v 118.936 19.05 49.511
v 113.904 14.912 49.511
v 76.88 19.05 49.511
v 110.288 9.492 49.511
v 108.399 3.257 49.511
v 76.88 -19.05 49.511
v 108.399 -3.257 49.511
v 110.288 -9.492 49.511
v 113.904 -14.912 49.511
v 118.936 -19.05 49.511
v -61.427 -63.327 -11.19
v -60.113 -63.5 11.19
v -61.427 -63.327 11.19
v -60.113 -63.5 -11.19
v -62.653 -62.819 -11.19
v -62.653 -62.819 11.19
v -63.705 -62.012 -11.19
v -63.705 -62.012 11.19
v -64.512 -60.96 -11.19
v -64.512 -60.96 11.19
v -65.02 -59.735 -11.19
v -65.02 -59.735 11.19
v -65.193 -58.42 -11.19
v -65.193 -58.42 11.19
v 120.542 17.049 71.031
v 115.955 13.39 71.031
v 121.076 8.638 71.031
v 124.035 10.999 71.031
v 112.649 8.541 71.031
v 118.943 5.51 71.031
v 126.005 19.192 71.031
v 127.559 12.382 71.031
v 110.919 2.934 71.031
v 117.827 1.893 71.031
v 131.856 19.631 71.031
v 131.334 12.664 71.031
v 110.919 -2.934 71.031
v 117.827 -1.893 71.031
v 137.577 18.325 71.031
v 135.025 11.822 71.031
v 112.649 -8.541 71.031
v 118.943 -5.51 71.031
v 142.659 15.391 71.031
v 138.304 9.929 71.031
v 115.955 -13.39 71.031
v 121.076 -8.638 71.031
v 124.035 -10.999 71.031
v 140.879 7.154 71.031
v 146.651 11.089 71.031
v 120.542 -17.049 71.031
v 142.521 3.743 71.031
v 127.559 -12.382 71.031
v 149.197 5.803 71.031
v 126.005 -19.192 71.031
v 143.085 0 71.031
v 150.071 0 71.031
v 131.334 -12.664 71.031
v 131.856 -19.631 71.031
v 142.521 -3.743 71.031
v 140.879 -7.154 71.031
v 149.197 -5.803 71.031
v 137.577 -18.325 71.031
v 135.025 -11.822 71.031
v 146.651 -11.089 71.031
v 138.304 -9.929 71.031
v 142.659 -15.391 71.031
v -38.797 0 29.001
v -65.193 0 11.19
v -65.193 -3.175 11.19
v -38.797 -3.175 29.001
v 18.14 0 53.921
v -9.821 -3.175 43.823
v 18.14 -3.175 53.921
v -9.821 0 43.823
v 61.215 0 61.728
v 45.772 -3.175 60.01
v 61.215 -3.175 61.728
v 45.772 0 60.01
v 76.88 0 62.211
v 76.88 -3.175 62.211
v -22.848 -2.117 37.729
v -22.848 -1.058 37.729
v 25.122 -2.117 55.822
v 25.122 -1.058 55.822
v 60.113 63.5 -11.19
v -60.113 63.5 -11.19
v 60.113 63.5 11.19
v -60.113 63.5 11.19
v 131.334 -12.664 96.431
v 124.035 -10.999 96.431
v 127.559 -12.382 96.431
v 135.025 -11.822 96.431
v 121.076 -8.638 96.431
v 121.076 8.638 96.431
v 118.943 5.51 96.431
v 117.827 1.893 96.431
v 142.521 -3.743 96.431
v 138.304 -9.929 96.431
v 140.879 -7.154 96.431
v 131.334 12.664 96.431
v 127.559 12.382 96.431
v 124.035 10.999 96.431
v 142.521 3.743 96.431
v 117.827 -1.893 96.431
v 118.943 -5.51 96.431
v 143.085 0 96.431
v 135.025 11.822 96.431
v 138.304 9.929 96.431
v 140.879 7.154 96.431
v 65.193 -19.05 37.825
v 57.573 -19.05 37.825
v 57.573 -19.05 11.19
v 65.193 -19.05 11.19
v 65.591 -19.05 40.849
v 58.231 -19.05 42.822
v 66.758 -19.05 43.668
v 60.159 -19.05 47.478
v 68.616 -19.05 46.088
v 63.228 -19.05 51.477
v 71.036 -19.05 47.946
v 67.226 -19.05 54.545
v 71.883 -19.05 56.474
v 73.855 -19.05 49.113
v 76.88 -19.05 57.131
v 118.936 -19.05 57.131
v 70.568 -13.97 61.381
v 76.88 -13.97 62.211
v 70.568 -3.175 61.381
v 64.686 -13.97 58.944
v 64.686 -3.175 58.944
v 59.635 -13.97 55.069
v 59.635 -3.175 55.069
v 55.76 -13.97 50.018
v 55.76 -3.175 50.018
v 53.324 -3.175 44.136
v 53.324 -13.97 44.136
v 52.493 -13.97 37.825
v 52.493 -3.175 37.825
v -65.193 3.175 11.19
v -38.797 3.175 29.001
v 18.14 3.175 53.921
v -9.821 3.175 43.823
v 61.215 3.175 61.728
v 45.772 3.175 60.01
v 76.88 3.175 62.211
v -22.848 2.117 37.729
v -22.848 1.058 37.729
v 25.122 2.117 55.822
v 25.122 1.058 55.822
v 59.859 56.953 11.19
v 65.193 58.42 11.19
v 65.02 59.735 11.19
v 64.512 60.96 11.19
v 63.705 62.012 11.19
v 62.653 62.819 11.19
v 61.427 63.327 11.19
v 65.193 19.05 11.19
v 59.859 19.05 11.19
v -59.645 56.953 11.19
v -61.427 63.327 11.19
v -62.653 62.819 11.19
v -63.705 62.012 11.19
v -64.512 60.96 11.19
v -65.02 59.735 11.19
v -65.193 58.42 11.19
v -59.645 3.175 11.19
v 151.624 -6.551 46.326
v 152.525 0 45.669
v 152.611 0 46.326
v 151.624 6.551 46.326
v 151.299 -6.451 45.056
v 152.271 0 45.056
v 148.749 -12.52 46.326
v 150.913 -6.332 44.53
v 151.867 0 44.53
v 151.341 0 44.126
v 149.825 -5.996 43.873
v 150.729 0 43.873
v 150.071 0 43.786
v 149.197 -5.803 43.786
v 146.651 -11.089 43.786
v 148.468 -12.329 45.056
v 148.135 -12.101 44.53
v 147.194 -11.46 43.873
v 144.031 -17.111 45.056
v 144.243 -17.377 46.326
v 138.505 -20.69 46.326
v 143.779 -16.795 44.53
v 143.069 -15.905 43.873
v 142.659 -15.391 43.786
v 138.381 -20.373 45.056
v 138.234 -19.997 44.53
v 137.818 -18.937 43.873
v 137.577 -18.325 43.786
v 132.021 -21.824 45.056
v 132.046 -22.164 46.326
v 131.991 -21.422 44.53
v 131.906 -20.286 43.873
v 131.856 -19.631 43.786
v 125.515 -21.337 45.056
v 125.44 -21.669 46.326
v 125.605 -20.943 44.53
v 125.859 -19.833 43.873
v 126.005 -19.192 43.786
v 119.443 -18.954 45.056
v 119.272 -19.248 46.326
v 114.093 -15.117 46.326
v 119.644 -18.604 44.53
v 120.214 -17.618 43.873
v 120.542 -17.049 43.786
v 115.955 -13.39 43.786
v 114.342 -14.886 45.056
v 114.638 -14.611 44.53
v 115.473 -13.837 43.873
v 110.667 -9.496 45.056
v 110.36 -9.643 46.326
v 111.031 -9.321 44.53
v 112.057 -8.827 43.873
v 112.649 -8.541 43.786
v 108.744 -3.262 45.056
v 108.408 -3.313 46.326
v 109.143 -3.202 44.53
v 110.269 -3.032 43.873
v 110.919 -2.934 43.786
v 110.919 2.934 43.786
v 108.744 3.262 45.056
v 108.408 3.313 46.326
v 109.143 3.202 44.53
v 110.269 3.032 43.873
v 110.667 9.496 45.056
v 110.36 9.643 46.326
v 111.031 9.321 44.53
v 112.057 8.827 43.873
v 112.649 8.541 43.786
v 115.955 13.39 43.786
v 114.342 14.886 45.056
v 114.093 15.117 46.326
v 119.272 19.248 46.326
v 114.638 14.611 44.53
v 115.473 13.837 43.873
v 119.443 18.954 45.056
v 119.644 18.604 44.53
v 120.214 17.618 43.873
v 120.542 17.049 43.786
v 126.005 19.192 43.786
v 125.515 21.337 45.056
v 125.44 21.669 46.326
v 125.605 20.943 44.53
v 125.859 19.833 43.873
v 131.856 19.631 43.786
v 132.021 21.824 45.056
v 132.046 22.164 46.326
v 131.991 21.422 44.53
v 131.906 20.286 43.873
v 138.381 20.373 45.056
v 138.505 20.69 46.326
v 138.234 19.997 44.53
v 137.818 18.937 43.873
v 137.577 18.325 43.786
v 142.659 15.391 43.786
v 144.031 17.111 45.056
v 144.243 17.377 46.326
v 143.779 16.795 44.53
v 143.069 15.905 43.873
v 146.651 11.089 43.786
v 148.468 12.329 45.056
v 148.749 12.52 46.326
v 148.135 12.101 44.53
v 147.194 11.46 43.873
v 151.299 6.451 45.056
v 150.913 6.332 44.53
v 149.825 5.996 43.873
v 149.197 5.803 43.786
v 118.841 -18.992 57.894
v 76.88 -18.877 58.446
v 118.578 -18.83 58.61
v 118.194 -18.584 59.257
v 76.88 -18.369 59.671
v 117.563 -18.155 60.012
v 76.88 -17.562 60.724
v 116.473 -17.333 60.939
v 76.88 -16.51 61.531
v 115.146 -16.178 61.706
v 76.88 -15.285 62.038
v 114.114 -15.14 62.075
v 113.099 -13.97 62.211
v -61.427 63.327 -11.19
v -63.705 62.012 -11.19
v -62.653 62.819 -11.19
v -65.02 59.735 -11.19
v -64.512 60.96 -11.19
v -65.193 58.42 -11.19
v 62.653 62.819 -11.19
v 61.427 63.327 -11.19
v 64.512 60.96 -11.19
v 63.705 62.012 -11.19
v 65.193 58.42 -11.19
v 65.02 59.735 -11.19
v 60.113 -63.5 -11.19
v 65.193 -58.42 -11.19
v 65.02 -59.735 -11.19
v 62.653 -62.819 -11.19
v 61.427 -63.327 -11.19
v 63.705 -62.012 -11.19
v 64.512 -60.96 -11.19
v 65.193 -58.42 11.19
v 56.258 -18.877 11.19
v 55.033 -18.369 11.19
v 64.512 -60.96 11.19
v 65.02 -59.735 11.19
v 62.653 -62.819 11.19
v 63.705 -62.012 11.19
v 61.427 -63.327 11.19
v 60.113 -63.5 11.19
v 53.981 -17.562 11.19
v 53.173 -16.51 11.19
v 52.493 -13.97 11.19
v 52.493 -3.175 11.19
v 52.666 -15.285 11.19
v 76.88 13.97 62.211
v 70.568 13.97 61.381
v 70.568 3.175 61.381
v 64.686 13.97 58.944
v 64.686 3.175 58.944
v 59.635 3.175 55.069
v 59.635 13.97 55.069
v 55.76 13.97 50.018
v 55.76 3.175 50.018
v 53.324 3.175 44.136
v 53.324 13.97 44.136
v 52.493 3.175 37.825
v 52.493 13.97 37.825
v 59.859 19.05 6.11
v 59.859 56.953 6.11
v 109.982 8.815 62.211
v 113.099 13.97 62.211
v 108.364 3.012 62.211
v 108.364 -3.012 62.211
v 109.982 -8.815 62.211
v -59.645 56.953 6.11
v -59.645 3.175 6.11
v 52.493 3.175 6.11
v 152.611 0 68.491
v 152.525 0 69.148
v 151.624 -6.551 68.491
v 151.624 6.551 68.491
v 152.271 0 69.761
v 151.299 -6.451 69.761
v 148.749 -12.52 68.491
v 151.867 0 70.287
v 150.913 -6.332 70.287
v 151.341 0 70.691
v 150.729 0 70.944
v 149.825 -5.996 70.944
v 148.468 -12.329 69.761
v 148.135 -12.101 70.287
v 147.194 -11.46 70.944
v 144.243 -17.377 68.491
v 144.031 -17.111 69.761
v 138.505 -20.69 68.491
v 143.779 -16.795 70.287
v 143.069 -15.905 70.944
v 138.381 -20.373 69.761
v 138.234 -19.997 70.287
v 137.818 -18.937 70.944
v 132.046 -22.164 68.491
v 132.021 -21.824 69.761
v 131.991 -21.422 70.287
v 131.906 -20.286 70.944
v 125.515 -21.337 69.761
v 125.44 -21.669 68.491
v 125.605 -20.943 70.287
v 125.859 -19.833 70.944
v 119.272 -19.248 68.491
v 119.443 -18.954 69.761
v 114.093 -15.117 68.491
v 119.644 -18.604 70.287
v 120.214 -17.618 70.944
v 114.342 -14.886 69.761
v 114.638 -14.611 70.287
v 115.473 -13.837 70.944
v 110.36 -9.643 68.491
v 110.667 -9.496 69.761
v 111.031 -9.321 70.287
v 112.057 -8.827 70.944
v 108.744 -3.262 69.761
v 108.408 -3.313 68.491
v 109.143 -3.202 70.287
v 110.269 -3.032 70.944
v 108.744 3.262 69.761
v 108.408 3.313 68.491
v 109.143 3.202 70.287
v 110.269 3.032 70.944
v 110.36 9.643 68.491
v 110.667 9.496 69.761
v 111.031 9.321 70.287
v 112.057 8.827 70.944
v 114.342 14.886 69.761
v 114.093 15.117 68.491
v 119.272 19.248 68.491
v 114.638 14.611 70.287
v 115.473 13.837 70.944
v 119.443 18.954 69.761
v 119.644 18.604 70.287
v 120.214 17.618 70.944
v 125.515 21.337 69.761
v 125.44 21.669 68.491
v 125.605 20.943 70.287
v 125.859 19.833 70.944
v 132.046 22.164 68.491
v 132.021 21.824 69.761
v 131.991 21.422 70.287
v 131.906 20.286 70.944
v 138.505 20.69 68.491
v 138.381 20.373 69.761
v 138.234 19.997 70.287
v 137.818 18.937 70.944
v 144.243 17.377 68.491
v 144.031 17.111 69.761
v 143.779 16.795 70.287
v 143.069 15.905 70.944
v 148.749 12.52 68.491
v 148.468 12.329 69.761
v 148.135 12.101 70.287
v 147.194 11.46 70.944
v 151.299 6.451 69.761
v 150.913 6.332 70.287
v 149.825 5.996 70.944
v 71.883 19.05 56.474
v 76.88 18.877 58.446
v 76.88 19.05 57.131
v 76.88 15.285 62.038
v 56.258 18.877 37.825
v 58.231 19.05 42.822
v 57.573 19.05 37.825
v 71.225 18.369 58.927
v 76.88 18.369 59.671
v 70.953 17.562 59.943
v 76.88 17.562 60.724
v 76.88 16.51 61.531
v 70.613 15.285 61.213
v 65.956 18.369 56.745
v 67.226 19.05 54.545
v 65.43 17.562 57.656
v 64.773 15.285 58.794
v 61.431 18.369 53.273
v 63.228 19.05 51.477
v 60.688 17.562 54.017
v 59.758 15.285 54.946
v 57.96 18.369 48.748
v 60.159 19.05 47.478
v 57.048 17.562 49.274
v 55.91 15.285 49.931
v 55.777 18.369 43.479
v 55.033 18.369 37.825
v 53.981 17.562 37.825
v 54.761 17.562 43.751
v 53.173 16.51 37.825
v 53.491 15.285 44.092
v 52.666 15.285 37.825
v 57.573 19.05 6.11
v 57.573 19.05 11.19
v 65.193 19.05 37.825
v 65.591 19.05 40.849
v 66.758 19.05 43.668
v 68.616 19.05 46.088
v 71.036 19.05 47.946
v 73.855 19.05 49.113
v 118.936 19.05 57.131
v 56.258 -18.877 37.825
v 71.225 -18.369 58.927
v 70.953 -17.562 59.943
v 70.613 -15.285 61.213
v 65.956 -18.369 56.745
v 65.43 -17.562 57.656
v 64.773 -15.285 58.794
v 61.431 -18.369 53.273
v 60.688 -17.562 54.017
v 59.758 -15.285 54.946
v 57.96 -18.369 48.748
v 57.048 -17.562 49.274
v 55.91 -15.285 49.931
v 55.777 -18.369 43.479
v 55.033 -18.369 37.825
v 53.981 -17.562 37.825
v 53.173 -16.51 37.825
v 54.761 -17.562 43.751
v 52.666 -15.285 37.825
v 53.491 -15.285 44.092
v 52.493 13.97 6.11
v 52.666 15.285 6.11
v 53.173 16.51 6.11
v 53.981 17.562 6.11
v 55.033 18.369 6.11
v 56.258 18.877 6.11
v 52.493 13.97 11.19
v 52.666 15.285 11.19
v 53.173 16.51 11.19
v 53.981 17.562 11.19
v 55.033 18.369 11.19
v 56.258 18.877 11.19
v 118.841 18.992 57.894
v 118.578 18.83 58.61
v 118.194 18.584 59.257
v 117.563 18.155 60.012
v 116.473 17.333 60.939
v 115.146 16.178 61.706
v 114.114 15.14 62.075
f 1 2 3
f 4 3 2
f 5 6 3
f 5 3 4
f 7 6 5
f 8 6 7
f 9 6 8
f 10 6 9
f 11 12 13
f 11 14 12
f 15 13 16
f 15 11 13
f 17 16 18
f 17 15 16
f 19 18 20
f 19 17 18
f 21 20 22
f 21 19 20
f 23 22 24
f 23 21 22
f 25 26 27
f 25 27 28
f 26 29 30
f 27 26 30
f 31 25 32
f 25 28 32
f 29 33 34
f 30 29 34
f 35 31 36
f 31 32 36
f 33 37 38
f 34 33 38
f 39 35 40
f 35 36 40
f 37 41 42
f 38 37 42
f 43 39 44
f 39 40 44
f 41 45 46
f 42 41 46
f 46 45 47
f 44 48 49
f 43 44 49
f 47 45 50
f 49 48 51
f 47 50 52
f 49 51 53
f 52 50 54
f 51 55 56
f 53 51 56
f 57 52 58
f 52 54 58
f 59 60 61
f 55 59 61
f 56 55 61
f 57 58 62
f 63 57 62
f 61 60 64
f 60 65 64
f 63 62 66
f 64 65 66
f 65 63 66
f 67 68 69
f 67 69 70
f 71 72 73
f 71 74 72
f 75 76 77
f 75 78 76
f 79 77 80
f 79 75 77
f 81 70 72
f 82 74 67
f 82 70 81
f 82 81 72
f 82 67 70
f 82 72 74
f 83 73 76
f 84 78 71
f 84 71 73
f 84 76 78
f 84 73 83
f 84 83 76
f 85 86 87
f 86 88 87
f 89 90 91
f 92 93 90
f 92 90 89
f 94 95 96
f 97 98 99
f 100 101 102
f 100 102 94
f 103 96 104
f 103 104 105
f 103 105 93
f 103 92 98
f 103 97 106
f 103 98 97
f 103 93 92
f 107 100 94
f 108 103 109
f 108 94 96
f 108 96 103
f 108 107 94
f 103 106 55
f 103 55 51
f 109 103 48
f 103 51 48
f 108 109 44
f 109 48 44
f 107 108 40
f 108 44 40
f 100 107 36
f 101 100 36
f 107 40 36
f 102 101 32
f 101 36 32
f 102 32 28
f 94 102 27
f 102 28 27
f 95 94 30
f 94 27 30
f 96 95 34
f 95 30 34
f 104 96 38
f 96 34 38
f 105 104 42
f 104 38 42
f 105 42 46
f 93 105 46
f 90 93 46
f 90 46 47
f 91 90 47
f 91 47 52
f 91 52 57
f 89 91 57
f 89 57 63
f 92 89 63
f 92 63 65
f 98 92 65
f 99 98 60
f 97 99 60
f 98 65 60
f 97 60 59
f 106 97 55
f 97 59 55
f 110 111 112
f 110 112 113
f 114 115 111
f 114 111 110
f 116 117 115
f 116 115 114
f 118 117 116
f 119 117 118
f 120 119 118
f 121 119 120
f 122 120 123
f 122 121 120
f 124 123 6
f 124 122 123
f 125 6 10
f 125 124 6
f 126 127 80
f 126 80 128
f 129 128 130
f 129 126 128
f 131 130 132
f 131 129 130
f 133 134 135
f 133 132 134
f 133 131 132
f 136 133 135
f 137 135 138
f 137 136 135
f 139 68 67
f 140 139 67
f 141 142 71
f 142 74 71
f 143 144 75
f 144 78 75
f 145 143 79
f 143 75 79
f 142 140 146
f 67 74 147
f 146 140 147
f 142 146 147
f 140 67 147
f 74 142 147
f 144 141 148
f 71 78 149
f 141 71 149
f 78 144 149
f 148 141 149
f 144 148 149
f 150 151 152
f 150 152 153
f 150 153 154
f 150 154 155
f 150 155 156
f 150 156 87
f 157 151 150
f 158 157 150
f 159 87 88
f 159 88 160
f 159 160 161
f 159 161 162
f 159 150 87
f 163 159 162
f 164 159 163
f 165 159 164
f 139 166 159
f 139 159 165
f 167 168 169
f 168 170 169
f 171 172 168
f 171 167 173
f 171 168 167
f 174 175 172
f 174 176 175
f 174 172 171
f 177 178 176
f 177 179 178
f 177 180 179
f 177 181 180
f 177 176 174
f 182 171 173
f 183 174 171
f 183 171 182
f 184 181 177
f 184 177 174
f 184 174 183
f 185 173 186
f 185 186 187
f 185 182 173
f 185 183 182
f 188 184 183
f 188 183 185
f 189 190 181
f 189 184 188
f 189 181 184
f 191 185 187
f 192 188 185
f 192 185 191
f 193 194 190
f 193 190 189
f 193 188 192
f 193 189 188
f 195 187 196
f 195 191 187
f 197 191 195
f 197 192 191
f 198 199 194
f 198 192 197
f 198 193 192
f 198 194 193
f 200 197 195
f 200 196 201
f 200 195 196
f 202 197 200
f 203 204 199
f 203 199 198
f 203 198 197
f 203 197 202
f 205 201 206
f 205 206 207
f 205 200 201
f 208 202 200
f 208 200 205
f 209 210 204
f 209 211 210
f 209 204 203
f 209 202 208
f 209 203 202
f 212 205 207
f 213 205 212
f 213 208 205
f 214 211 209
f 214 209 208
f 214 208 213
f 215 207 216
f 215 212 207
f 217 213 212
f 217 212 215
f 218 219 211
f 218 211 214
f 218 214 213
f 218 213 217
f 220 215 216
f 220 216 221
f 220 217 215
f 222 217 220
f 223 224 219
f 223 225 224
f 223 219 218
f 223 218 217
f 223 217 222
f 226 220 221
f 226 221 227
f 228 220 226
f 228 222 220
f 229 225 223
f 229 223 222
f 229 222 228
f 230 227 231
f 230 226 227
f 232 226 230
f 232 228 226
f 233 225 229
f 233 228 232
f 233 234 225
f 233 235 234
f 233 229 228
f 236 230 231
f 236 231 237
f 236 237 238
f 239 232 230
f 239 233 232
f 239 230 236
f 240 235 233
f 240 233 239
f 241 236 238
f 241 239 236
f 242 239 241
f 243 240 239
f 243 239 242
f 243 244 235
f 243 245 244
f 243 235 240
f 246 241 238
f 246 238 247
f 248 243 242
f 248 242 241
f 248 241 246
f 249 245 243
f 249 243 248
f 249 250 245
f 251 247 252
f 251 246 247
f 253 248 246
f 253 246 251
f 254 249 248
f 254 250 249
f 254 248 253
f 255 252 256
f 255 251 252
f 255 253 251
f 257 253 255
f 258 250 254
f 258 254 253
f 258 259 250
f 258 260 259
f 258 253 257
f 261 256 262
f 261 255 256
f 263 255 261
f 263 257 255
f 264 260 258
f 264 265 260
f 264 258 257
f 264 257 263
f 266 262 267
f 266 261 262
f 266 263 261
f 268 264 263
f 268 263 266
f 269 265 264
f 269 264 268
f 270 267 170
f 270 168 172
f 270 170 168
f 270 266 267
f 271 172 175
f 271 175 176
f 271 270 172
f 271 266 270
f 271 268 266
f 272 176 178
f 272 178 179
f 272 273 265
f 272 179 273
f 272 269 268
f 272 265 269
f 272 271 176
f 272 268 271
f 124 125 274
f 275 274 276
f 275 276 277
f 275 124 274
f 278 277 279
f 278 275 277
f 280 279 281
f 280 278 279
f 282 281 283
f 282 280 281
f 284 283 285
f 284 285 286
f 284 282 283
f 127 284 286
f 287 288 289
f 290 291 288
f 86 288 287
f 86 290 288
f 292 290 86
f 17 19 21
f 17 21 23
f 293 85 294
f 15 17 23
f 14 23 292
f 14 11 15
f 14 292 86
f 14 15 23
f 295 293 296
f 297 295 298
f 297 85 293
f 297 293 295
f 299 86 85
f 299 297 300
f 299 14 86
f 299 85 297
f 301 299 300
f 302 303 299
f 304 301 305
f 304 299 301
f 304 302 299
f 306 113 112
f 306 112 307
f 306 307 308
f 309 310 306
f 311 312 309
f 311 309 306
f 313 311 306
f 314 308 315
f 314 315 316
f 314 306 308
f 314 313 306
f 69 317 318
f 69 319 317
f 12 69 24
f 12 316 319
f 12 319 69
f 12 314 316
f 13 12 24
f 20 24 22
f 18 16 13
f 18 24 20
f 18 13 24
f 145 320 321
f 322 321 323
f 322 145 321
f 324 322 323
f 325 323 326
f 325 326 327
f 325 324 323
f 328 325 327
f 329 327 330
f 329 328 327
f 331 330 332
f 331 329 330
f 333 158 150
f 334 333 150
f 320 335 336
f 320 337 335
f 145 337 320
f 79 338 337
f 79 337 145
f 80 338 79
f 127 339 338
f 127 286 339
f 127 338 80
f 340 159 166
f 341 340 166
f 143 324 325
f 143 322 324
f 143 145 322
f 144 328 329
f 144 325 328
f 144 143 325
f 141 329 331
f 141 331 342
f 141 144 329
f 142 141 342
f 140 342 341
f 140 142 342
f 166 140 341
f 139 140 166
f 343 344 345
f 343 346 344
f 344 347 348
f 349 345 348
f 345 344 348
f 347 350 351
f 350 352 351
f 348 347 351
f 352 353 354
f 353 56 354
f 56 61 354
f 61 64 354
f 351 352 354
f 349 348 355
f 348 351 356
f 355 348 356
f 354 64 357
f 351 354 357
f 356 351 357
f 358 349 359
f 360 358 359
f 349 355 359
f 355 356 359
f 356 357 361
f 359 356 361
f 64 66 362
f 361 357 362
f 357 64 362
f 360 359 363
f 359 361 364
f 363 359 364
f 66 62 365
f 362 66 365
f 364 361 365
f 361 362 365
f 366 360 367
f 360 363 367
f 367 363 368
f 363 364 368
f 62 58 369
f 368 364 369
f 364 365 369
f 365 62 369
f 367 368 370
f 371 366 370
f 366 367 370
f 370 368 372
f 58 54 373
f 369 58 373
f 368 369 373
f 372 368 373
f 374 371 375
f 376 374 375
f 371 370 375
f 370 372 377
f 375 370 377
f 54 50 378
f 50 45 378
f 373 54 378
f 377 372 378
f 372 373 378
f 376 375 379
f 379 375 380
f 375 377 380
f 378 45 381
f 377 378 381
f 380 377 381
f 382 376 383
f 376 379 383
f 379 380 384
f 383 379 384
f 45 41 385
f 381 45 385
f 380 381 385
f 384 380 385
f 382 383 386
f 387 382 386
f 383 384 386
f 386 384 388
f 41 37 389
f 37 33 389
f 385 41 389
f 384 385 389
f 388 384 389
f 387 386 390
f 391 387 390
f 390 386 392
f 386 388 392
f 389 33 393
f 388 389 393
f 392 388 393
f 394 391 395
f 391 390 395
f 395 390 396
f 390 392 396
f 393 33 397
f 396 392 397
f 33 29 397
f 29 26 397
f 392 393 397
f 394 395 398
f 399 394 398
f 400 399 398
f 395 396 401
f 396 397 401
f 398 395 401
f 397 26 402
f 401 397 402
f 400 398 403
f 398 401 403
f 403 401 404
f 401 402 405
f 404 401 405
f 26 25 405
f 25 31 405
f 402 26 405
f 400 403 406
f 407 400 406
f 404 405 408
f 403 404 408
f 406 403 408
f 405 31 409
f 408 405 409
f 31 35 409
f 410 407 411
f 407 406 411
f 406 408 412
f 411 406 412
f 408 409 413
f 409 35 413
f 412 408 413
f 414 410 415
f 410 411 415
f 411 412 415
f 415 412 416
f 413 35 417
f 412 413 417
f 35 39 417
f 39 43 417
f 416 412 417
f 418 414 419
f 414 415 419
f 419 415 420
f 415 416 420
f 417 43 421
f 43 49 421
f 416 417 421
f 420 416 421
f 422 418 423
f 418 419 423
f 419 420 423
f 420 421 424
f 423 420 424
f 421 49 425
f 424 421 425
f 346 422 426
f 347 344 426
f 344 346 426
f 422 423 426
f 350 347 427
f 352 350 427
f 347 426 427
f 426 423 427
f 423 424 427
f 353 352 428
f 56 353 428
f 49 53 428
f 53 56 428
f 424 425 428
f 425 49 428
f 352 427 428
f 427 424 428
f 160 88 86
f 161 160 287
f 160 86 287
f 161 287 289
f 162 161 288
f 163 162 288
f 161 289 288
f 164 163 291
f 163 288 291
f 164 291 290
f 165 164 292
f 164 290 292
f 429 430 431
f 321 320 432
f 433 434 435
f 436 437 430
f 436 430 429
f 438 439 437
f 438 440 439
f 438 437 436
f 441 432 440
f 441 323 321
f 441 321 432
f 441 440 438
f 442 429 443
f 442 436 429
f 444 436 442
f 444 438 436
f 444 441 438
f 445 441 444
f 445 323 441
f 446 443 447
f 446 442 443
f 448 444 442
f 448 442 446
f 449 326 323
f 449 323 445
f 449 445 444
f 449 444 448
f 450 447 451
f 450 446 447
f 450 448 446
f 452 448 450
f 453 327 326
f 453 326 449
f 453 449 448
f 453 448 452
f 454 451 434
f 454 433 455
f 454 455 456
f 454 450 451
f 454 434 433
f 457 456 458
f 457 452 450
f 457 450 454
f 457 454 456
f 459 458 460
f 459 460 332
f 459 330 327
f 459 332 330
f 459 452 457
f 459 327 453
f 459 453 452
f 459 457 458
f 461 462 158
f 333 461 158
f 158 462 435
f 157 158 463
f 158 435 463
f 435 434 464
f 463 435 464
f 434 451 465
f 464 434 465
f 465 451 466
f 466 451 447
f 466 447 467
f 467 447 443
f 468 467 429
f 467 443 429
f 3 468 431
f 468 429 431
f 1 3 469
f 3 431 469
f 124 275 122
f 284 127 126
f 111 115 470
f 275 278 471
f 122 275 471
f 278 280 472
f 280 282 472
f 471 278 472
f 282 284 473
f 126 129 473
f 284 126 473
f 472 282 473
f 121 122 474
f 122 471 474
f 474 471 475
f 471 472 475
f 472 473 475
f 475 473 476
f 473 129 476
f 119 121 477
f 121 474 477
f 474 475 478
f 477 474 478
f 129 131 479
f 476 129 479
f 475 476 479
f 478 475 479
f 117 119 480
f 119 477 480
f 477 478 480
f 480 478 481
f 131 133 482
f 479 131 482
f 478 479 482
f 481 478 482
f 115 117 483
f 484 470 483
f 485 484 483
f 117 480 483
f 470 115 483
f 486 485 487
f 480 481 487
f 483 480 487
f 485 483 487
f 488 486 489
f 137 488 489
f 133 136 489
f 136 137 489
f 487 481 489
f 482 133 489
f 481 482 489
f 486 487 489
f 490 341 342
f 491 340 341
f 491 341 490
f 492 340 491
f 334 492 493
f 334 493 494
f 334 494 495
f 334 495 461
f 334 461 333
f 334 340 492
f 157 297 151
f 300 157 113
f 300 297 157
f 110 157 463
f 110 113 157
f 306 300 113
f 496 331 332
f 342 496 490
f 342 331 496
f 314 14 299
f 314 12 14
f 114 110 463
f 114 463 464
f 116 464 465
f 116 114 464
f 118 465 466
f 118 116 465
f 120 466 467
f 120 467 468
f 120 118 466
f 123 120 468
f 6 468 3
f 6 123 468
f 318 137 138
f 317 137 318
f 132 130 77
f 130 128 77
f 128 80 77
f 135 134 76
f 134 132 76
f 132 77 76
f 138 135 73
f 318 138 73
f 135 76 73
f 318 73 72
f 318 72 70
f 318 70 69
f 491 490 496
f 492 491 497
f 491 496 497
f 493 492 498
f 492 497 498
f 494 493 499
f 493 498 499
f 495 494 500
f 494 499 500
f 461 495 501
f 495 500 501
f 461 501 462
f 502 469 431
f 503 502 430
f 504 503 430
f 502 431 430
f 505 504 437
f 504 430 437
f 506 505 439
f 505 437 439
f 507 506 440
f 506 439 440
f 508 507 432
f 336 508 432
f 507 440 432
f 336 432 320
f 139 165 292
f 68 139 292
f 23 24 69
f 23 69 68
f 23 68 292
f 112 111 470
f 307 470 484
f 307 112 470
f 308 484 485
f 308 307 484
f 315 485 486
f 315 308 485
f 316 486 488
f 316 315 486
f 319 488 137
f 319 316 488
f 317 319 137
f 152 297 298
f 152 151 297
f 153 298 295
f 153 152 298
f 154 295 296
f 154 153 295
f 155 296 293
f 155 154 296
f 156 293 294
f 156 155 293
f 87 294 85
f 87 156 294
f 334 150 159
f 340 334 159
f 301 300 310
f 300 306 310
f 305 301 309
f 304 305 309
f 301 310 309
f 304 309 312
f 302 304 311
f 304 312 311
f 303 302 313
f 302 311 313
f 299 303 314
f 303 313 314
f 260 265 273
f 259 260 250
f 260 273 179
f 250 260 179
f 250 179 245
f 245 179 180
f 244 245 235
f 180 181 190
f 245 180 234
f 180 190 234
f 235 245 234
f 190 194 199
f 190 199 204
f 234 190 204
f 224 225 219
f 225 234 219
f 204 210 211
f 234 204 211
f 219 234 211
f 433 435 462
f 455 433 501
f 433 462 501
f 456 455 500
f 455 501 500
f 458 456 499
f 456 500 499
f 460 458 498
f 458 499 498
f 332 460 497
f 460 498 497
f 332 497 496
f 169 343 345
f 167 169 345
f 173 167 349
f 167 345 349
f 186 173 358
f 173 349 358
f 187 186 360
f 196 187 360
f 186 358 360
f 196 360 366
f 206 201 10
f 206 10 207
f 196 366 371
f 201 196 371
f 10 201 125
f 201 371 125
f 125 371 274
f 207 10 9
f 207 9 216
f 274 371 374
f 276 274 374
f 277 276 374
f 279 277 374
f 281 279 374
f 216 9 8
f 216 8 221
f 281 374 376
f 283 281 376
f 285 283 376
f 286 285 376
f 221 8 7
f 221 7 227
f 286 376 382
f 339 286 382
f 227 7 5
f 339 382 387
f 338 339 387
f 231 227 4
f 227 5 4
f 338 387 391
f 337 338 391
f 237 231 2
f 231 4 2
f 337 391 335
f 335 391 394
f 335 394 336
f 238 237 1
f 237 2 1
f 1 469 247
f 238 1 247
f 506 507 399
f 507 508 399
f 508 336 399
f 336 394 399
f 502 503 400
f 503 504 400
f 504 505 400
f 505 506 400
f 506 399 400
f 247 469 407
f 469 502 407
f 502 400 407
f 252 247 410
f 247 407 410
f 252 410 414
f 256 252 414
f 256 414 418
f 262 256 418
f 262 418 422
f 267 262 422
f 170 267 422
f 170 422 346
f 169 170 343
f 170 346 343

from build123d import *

# Parameters (mm, degrees)
F1_DEPTH  = 63.5
F0_W      = 22.2259311114
F0_H      = 12.7
F2_DEPTH  = 19.05
F3_DEPTH  = 3.175
F5_R      = 5.08
F6_R      = 2.54
F7_R      = 2.54
F8_R      = 12.7
F9_DEPTH  = 25.4
F11_DEPTH = 5.08


with BuildPart() as f1:
    # F0 (on Front) → F1 (new body, symmetric)
    with BuildSketch(Plane.XZ):
        Polygon((52.4926696301, 11.1897839233), (-65.1926696301, 11.1897839233), (-65.1926696301, -11.1897839233), (65.1926696301, -11.1897839233), (65.1926696301, 11.1897839233), align=None)
    extrude(amount=F1_DEPTH, both=True)

    # F0 (on Front) → F2 (join, symmetric)
    with BuildSketch(Plane.XZ):
        with BuildLine():
            Line((52.4926696301, 37.8246089722), (52.4926696301, 11.1897839233))
            Line((52.4926696301, 11.1897839233), (65.1926696301, 11.1897839233))
            Line((65.1926696301, 11.1897839233), (65.1926696301, 37.8246089722))
            ThreePointArc((65.1926696301, 37.8246089722), (68.6156766444, 46.0884789304), (76.8795466026, 49.5114859448))
            Line((76.8795466026, 49.5114859448), (108.1594081487, 49.5114859448))
            Line((108.1594081487, 49.5114859448), (108.1594081487, 62.2114859448))
            Line((108.1594081487, 62.2114859448), (76.8795466026, 62.2114859448))
            ThreePointArc((76.8795466026, 62.2114859448), (59.6354205233, 55.0687350515), (52.4926696301, 37.8246089722))
        make_face()
        with Locations((119.2723737044, 55.8614859448)):
            Rectangle(F0_W, F0_H)
    extrude(amount=F2_DEPTH, both=True)

    # F0 (on Front) → F3 (join, symmetric)
    with BuildSketch(Plane.XZ):
        with BuildLine():
            add(Edge.make_bspline(
                [(-65.1926696301, 11.1897839233), (-26.2716710567, 40.8670417964), (23.8391105086, 62.7601072192), (76.8795466026, 62.2114859448)],
                knots=[0, 0, 0, 0, 150.9560489097, 150.9560489097, 150.9560489097, 150.9560489097], degree=3))
            Line((-65.1926696301, 11.1897839233), (52.4926696301, 11.1897839233))
            Line((52.4926696301, 11.1897839233), (52.4926696301, 37.8246089722))
            ThreePointArc((52.4926696301, 37.8246089722), (59.6354205233, 55.0687350515), (76.8795466026, 62.2114859448))
        make_face()
        with Locations((119.2723737044, 55.8614859448)):
            Rectangle(F0_W, F0_H)
    extrude(amount=F3_DEPTH, both=True)

    # F0 (on Front) → F4 (revolve)
    with BuildSketch(Plane.XZ):
        Polygon((130.3853392601, 71.0308142006), (130.3853392601, 62.2114859448), (130.3853392601, 49.5114859448), (130.3853392601, 43.7861196697), (152.6112703715, 43.7861196697), (152.6112703715, 71.0308142006), align=None)
    revolve(axis=Axis((130.3853392601, 0, 57.4084669352), (0, 0, -1)))

    # F5
    f5_edges = [f1.edges().sort_by_distance(p)[0] for p in [
        (-65.19267, -63.5, 0),
        (65.19267, -63.5, 0),
        (65.19267, 63.5, 0),
        (-65.19267, 63.5, 0),
        (52.49267, 19.05, 24.507196),
        (52.49267, -19.05, 24.507196),
    ]]
    fillet(f5_edges, radius=F5_R)

    # F6
    f6_edges = [f1.edges().sort_by_distance(p)[0] for p in [
        (108.159408, 0, 71.030814),
    ]]
    fillet(f6_edges, radius=F6_R)

    # F7
    f7_edges = [f1.edges().sort_by_distance(p)[0] for p in [
        (108.159408, 0, 43.78612),
    ]]
    fillet(f7_edges, radius=F7_R)

    # F8 (on face) → F9 (join)
    with BuildSketch(Plane.XY.offset(71.0308142006)):
        with Locations((130.3853392601, 0)):
            Circle(F8_R)
    extrude(amount=F9_DEPTH)

    # F10 (on face) → F11 (cut)
    with BuildSketch(Plane.XY.offset(11.1897839233)):
        with BuildLine():
            Line((59.8586685956, 56.9533742964), (-59.6454292536, 56.9533742964))
            Line((-59.6454292536, 56.9533742964), (-59.6454292536, 3.175))
            Line((-59.6454292536, 3.175), (52.4926696301, 3.175))
            Line((52.4926696301, 3.175), (52.4926696301, 13.97))
            ThreePointArc((52.4926696301, 13.97), (53.9805671816, 17.5621024484), (57.5726696301, 19.05))
            Line((57.5726696301, 19.05), (59.8586685956, 19.05))
            Line((59.8586685956, 19.05), (59.8586685956, 56.9533742964))
        make_face()
    extrude(amount=-F11_DEPTH, mode=Mode.SUBTRACT)


solid = f1.part
